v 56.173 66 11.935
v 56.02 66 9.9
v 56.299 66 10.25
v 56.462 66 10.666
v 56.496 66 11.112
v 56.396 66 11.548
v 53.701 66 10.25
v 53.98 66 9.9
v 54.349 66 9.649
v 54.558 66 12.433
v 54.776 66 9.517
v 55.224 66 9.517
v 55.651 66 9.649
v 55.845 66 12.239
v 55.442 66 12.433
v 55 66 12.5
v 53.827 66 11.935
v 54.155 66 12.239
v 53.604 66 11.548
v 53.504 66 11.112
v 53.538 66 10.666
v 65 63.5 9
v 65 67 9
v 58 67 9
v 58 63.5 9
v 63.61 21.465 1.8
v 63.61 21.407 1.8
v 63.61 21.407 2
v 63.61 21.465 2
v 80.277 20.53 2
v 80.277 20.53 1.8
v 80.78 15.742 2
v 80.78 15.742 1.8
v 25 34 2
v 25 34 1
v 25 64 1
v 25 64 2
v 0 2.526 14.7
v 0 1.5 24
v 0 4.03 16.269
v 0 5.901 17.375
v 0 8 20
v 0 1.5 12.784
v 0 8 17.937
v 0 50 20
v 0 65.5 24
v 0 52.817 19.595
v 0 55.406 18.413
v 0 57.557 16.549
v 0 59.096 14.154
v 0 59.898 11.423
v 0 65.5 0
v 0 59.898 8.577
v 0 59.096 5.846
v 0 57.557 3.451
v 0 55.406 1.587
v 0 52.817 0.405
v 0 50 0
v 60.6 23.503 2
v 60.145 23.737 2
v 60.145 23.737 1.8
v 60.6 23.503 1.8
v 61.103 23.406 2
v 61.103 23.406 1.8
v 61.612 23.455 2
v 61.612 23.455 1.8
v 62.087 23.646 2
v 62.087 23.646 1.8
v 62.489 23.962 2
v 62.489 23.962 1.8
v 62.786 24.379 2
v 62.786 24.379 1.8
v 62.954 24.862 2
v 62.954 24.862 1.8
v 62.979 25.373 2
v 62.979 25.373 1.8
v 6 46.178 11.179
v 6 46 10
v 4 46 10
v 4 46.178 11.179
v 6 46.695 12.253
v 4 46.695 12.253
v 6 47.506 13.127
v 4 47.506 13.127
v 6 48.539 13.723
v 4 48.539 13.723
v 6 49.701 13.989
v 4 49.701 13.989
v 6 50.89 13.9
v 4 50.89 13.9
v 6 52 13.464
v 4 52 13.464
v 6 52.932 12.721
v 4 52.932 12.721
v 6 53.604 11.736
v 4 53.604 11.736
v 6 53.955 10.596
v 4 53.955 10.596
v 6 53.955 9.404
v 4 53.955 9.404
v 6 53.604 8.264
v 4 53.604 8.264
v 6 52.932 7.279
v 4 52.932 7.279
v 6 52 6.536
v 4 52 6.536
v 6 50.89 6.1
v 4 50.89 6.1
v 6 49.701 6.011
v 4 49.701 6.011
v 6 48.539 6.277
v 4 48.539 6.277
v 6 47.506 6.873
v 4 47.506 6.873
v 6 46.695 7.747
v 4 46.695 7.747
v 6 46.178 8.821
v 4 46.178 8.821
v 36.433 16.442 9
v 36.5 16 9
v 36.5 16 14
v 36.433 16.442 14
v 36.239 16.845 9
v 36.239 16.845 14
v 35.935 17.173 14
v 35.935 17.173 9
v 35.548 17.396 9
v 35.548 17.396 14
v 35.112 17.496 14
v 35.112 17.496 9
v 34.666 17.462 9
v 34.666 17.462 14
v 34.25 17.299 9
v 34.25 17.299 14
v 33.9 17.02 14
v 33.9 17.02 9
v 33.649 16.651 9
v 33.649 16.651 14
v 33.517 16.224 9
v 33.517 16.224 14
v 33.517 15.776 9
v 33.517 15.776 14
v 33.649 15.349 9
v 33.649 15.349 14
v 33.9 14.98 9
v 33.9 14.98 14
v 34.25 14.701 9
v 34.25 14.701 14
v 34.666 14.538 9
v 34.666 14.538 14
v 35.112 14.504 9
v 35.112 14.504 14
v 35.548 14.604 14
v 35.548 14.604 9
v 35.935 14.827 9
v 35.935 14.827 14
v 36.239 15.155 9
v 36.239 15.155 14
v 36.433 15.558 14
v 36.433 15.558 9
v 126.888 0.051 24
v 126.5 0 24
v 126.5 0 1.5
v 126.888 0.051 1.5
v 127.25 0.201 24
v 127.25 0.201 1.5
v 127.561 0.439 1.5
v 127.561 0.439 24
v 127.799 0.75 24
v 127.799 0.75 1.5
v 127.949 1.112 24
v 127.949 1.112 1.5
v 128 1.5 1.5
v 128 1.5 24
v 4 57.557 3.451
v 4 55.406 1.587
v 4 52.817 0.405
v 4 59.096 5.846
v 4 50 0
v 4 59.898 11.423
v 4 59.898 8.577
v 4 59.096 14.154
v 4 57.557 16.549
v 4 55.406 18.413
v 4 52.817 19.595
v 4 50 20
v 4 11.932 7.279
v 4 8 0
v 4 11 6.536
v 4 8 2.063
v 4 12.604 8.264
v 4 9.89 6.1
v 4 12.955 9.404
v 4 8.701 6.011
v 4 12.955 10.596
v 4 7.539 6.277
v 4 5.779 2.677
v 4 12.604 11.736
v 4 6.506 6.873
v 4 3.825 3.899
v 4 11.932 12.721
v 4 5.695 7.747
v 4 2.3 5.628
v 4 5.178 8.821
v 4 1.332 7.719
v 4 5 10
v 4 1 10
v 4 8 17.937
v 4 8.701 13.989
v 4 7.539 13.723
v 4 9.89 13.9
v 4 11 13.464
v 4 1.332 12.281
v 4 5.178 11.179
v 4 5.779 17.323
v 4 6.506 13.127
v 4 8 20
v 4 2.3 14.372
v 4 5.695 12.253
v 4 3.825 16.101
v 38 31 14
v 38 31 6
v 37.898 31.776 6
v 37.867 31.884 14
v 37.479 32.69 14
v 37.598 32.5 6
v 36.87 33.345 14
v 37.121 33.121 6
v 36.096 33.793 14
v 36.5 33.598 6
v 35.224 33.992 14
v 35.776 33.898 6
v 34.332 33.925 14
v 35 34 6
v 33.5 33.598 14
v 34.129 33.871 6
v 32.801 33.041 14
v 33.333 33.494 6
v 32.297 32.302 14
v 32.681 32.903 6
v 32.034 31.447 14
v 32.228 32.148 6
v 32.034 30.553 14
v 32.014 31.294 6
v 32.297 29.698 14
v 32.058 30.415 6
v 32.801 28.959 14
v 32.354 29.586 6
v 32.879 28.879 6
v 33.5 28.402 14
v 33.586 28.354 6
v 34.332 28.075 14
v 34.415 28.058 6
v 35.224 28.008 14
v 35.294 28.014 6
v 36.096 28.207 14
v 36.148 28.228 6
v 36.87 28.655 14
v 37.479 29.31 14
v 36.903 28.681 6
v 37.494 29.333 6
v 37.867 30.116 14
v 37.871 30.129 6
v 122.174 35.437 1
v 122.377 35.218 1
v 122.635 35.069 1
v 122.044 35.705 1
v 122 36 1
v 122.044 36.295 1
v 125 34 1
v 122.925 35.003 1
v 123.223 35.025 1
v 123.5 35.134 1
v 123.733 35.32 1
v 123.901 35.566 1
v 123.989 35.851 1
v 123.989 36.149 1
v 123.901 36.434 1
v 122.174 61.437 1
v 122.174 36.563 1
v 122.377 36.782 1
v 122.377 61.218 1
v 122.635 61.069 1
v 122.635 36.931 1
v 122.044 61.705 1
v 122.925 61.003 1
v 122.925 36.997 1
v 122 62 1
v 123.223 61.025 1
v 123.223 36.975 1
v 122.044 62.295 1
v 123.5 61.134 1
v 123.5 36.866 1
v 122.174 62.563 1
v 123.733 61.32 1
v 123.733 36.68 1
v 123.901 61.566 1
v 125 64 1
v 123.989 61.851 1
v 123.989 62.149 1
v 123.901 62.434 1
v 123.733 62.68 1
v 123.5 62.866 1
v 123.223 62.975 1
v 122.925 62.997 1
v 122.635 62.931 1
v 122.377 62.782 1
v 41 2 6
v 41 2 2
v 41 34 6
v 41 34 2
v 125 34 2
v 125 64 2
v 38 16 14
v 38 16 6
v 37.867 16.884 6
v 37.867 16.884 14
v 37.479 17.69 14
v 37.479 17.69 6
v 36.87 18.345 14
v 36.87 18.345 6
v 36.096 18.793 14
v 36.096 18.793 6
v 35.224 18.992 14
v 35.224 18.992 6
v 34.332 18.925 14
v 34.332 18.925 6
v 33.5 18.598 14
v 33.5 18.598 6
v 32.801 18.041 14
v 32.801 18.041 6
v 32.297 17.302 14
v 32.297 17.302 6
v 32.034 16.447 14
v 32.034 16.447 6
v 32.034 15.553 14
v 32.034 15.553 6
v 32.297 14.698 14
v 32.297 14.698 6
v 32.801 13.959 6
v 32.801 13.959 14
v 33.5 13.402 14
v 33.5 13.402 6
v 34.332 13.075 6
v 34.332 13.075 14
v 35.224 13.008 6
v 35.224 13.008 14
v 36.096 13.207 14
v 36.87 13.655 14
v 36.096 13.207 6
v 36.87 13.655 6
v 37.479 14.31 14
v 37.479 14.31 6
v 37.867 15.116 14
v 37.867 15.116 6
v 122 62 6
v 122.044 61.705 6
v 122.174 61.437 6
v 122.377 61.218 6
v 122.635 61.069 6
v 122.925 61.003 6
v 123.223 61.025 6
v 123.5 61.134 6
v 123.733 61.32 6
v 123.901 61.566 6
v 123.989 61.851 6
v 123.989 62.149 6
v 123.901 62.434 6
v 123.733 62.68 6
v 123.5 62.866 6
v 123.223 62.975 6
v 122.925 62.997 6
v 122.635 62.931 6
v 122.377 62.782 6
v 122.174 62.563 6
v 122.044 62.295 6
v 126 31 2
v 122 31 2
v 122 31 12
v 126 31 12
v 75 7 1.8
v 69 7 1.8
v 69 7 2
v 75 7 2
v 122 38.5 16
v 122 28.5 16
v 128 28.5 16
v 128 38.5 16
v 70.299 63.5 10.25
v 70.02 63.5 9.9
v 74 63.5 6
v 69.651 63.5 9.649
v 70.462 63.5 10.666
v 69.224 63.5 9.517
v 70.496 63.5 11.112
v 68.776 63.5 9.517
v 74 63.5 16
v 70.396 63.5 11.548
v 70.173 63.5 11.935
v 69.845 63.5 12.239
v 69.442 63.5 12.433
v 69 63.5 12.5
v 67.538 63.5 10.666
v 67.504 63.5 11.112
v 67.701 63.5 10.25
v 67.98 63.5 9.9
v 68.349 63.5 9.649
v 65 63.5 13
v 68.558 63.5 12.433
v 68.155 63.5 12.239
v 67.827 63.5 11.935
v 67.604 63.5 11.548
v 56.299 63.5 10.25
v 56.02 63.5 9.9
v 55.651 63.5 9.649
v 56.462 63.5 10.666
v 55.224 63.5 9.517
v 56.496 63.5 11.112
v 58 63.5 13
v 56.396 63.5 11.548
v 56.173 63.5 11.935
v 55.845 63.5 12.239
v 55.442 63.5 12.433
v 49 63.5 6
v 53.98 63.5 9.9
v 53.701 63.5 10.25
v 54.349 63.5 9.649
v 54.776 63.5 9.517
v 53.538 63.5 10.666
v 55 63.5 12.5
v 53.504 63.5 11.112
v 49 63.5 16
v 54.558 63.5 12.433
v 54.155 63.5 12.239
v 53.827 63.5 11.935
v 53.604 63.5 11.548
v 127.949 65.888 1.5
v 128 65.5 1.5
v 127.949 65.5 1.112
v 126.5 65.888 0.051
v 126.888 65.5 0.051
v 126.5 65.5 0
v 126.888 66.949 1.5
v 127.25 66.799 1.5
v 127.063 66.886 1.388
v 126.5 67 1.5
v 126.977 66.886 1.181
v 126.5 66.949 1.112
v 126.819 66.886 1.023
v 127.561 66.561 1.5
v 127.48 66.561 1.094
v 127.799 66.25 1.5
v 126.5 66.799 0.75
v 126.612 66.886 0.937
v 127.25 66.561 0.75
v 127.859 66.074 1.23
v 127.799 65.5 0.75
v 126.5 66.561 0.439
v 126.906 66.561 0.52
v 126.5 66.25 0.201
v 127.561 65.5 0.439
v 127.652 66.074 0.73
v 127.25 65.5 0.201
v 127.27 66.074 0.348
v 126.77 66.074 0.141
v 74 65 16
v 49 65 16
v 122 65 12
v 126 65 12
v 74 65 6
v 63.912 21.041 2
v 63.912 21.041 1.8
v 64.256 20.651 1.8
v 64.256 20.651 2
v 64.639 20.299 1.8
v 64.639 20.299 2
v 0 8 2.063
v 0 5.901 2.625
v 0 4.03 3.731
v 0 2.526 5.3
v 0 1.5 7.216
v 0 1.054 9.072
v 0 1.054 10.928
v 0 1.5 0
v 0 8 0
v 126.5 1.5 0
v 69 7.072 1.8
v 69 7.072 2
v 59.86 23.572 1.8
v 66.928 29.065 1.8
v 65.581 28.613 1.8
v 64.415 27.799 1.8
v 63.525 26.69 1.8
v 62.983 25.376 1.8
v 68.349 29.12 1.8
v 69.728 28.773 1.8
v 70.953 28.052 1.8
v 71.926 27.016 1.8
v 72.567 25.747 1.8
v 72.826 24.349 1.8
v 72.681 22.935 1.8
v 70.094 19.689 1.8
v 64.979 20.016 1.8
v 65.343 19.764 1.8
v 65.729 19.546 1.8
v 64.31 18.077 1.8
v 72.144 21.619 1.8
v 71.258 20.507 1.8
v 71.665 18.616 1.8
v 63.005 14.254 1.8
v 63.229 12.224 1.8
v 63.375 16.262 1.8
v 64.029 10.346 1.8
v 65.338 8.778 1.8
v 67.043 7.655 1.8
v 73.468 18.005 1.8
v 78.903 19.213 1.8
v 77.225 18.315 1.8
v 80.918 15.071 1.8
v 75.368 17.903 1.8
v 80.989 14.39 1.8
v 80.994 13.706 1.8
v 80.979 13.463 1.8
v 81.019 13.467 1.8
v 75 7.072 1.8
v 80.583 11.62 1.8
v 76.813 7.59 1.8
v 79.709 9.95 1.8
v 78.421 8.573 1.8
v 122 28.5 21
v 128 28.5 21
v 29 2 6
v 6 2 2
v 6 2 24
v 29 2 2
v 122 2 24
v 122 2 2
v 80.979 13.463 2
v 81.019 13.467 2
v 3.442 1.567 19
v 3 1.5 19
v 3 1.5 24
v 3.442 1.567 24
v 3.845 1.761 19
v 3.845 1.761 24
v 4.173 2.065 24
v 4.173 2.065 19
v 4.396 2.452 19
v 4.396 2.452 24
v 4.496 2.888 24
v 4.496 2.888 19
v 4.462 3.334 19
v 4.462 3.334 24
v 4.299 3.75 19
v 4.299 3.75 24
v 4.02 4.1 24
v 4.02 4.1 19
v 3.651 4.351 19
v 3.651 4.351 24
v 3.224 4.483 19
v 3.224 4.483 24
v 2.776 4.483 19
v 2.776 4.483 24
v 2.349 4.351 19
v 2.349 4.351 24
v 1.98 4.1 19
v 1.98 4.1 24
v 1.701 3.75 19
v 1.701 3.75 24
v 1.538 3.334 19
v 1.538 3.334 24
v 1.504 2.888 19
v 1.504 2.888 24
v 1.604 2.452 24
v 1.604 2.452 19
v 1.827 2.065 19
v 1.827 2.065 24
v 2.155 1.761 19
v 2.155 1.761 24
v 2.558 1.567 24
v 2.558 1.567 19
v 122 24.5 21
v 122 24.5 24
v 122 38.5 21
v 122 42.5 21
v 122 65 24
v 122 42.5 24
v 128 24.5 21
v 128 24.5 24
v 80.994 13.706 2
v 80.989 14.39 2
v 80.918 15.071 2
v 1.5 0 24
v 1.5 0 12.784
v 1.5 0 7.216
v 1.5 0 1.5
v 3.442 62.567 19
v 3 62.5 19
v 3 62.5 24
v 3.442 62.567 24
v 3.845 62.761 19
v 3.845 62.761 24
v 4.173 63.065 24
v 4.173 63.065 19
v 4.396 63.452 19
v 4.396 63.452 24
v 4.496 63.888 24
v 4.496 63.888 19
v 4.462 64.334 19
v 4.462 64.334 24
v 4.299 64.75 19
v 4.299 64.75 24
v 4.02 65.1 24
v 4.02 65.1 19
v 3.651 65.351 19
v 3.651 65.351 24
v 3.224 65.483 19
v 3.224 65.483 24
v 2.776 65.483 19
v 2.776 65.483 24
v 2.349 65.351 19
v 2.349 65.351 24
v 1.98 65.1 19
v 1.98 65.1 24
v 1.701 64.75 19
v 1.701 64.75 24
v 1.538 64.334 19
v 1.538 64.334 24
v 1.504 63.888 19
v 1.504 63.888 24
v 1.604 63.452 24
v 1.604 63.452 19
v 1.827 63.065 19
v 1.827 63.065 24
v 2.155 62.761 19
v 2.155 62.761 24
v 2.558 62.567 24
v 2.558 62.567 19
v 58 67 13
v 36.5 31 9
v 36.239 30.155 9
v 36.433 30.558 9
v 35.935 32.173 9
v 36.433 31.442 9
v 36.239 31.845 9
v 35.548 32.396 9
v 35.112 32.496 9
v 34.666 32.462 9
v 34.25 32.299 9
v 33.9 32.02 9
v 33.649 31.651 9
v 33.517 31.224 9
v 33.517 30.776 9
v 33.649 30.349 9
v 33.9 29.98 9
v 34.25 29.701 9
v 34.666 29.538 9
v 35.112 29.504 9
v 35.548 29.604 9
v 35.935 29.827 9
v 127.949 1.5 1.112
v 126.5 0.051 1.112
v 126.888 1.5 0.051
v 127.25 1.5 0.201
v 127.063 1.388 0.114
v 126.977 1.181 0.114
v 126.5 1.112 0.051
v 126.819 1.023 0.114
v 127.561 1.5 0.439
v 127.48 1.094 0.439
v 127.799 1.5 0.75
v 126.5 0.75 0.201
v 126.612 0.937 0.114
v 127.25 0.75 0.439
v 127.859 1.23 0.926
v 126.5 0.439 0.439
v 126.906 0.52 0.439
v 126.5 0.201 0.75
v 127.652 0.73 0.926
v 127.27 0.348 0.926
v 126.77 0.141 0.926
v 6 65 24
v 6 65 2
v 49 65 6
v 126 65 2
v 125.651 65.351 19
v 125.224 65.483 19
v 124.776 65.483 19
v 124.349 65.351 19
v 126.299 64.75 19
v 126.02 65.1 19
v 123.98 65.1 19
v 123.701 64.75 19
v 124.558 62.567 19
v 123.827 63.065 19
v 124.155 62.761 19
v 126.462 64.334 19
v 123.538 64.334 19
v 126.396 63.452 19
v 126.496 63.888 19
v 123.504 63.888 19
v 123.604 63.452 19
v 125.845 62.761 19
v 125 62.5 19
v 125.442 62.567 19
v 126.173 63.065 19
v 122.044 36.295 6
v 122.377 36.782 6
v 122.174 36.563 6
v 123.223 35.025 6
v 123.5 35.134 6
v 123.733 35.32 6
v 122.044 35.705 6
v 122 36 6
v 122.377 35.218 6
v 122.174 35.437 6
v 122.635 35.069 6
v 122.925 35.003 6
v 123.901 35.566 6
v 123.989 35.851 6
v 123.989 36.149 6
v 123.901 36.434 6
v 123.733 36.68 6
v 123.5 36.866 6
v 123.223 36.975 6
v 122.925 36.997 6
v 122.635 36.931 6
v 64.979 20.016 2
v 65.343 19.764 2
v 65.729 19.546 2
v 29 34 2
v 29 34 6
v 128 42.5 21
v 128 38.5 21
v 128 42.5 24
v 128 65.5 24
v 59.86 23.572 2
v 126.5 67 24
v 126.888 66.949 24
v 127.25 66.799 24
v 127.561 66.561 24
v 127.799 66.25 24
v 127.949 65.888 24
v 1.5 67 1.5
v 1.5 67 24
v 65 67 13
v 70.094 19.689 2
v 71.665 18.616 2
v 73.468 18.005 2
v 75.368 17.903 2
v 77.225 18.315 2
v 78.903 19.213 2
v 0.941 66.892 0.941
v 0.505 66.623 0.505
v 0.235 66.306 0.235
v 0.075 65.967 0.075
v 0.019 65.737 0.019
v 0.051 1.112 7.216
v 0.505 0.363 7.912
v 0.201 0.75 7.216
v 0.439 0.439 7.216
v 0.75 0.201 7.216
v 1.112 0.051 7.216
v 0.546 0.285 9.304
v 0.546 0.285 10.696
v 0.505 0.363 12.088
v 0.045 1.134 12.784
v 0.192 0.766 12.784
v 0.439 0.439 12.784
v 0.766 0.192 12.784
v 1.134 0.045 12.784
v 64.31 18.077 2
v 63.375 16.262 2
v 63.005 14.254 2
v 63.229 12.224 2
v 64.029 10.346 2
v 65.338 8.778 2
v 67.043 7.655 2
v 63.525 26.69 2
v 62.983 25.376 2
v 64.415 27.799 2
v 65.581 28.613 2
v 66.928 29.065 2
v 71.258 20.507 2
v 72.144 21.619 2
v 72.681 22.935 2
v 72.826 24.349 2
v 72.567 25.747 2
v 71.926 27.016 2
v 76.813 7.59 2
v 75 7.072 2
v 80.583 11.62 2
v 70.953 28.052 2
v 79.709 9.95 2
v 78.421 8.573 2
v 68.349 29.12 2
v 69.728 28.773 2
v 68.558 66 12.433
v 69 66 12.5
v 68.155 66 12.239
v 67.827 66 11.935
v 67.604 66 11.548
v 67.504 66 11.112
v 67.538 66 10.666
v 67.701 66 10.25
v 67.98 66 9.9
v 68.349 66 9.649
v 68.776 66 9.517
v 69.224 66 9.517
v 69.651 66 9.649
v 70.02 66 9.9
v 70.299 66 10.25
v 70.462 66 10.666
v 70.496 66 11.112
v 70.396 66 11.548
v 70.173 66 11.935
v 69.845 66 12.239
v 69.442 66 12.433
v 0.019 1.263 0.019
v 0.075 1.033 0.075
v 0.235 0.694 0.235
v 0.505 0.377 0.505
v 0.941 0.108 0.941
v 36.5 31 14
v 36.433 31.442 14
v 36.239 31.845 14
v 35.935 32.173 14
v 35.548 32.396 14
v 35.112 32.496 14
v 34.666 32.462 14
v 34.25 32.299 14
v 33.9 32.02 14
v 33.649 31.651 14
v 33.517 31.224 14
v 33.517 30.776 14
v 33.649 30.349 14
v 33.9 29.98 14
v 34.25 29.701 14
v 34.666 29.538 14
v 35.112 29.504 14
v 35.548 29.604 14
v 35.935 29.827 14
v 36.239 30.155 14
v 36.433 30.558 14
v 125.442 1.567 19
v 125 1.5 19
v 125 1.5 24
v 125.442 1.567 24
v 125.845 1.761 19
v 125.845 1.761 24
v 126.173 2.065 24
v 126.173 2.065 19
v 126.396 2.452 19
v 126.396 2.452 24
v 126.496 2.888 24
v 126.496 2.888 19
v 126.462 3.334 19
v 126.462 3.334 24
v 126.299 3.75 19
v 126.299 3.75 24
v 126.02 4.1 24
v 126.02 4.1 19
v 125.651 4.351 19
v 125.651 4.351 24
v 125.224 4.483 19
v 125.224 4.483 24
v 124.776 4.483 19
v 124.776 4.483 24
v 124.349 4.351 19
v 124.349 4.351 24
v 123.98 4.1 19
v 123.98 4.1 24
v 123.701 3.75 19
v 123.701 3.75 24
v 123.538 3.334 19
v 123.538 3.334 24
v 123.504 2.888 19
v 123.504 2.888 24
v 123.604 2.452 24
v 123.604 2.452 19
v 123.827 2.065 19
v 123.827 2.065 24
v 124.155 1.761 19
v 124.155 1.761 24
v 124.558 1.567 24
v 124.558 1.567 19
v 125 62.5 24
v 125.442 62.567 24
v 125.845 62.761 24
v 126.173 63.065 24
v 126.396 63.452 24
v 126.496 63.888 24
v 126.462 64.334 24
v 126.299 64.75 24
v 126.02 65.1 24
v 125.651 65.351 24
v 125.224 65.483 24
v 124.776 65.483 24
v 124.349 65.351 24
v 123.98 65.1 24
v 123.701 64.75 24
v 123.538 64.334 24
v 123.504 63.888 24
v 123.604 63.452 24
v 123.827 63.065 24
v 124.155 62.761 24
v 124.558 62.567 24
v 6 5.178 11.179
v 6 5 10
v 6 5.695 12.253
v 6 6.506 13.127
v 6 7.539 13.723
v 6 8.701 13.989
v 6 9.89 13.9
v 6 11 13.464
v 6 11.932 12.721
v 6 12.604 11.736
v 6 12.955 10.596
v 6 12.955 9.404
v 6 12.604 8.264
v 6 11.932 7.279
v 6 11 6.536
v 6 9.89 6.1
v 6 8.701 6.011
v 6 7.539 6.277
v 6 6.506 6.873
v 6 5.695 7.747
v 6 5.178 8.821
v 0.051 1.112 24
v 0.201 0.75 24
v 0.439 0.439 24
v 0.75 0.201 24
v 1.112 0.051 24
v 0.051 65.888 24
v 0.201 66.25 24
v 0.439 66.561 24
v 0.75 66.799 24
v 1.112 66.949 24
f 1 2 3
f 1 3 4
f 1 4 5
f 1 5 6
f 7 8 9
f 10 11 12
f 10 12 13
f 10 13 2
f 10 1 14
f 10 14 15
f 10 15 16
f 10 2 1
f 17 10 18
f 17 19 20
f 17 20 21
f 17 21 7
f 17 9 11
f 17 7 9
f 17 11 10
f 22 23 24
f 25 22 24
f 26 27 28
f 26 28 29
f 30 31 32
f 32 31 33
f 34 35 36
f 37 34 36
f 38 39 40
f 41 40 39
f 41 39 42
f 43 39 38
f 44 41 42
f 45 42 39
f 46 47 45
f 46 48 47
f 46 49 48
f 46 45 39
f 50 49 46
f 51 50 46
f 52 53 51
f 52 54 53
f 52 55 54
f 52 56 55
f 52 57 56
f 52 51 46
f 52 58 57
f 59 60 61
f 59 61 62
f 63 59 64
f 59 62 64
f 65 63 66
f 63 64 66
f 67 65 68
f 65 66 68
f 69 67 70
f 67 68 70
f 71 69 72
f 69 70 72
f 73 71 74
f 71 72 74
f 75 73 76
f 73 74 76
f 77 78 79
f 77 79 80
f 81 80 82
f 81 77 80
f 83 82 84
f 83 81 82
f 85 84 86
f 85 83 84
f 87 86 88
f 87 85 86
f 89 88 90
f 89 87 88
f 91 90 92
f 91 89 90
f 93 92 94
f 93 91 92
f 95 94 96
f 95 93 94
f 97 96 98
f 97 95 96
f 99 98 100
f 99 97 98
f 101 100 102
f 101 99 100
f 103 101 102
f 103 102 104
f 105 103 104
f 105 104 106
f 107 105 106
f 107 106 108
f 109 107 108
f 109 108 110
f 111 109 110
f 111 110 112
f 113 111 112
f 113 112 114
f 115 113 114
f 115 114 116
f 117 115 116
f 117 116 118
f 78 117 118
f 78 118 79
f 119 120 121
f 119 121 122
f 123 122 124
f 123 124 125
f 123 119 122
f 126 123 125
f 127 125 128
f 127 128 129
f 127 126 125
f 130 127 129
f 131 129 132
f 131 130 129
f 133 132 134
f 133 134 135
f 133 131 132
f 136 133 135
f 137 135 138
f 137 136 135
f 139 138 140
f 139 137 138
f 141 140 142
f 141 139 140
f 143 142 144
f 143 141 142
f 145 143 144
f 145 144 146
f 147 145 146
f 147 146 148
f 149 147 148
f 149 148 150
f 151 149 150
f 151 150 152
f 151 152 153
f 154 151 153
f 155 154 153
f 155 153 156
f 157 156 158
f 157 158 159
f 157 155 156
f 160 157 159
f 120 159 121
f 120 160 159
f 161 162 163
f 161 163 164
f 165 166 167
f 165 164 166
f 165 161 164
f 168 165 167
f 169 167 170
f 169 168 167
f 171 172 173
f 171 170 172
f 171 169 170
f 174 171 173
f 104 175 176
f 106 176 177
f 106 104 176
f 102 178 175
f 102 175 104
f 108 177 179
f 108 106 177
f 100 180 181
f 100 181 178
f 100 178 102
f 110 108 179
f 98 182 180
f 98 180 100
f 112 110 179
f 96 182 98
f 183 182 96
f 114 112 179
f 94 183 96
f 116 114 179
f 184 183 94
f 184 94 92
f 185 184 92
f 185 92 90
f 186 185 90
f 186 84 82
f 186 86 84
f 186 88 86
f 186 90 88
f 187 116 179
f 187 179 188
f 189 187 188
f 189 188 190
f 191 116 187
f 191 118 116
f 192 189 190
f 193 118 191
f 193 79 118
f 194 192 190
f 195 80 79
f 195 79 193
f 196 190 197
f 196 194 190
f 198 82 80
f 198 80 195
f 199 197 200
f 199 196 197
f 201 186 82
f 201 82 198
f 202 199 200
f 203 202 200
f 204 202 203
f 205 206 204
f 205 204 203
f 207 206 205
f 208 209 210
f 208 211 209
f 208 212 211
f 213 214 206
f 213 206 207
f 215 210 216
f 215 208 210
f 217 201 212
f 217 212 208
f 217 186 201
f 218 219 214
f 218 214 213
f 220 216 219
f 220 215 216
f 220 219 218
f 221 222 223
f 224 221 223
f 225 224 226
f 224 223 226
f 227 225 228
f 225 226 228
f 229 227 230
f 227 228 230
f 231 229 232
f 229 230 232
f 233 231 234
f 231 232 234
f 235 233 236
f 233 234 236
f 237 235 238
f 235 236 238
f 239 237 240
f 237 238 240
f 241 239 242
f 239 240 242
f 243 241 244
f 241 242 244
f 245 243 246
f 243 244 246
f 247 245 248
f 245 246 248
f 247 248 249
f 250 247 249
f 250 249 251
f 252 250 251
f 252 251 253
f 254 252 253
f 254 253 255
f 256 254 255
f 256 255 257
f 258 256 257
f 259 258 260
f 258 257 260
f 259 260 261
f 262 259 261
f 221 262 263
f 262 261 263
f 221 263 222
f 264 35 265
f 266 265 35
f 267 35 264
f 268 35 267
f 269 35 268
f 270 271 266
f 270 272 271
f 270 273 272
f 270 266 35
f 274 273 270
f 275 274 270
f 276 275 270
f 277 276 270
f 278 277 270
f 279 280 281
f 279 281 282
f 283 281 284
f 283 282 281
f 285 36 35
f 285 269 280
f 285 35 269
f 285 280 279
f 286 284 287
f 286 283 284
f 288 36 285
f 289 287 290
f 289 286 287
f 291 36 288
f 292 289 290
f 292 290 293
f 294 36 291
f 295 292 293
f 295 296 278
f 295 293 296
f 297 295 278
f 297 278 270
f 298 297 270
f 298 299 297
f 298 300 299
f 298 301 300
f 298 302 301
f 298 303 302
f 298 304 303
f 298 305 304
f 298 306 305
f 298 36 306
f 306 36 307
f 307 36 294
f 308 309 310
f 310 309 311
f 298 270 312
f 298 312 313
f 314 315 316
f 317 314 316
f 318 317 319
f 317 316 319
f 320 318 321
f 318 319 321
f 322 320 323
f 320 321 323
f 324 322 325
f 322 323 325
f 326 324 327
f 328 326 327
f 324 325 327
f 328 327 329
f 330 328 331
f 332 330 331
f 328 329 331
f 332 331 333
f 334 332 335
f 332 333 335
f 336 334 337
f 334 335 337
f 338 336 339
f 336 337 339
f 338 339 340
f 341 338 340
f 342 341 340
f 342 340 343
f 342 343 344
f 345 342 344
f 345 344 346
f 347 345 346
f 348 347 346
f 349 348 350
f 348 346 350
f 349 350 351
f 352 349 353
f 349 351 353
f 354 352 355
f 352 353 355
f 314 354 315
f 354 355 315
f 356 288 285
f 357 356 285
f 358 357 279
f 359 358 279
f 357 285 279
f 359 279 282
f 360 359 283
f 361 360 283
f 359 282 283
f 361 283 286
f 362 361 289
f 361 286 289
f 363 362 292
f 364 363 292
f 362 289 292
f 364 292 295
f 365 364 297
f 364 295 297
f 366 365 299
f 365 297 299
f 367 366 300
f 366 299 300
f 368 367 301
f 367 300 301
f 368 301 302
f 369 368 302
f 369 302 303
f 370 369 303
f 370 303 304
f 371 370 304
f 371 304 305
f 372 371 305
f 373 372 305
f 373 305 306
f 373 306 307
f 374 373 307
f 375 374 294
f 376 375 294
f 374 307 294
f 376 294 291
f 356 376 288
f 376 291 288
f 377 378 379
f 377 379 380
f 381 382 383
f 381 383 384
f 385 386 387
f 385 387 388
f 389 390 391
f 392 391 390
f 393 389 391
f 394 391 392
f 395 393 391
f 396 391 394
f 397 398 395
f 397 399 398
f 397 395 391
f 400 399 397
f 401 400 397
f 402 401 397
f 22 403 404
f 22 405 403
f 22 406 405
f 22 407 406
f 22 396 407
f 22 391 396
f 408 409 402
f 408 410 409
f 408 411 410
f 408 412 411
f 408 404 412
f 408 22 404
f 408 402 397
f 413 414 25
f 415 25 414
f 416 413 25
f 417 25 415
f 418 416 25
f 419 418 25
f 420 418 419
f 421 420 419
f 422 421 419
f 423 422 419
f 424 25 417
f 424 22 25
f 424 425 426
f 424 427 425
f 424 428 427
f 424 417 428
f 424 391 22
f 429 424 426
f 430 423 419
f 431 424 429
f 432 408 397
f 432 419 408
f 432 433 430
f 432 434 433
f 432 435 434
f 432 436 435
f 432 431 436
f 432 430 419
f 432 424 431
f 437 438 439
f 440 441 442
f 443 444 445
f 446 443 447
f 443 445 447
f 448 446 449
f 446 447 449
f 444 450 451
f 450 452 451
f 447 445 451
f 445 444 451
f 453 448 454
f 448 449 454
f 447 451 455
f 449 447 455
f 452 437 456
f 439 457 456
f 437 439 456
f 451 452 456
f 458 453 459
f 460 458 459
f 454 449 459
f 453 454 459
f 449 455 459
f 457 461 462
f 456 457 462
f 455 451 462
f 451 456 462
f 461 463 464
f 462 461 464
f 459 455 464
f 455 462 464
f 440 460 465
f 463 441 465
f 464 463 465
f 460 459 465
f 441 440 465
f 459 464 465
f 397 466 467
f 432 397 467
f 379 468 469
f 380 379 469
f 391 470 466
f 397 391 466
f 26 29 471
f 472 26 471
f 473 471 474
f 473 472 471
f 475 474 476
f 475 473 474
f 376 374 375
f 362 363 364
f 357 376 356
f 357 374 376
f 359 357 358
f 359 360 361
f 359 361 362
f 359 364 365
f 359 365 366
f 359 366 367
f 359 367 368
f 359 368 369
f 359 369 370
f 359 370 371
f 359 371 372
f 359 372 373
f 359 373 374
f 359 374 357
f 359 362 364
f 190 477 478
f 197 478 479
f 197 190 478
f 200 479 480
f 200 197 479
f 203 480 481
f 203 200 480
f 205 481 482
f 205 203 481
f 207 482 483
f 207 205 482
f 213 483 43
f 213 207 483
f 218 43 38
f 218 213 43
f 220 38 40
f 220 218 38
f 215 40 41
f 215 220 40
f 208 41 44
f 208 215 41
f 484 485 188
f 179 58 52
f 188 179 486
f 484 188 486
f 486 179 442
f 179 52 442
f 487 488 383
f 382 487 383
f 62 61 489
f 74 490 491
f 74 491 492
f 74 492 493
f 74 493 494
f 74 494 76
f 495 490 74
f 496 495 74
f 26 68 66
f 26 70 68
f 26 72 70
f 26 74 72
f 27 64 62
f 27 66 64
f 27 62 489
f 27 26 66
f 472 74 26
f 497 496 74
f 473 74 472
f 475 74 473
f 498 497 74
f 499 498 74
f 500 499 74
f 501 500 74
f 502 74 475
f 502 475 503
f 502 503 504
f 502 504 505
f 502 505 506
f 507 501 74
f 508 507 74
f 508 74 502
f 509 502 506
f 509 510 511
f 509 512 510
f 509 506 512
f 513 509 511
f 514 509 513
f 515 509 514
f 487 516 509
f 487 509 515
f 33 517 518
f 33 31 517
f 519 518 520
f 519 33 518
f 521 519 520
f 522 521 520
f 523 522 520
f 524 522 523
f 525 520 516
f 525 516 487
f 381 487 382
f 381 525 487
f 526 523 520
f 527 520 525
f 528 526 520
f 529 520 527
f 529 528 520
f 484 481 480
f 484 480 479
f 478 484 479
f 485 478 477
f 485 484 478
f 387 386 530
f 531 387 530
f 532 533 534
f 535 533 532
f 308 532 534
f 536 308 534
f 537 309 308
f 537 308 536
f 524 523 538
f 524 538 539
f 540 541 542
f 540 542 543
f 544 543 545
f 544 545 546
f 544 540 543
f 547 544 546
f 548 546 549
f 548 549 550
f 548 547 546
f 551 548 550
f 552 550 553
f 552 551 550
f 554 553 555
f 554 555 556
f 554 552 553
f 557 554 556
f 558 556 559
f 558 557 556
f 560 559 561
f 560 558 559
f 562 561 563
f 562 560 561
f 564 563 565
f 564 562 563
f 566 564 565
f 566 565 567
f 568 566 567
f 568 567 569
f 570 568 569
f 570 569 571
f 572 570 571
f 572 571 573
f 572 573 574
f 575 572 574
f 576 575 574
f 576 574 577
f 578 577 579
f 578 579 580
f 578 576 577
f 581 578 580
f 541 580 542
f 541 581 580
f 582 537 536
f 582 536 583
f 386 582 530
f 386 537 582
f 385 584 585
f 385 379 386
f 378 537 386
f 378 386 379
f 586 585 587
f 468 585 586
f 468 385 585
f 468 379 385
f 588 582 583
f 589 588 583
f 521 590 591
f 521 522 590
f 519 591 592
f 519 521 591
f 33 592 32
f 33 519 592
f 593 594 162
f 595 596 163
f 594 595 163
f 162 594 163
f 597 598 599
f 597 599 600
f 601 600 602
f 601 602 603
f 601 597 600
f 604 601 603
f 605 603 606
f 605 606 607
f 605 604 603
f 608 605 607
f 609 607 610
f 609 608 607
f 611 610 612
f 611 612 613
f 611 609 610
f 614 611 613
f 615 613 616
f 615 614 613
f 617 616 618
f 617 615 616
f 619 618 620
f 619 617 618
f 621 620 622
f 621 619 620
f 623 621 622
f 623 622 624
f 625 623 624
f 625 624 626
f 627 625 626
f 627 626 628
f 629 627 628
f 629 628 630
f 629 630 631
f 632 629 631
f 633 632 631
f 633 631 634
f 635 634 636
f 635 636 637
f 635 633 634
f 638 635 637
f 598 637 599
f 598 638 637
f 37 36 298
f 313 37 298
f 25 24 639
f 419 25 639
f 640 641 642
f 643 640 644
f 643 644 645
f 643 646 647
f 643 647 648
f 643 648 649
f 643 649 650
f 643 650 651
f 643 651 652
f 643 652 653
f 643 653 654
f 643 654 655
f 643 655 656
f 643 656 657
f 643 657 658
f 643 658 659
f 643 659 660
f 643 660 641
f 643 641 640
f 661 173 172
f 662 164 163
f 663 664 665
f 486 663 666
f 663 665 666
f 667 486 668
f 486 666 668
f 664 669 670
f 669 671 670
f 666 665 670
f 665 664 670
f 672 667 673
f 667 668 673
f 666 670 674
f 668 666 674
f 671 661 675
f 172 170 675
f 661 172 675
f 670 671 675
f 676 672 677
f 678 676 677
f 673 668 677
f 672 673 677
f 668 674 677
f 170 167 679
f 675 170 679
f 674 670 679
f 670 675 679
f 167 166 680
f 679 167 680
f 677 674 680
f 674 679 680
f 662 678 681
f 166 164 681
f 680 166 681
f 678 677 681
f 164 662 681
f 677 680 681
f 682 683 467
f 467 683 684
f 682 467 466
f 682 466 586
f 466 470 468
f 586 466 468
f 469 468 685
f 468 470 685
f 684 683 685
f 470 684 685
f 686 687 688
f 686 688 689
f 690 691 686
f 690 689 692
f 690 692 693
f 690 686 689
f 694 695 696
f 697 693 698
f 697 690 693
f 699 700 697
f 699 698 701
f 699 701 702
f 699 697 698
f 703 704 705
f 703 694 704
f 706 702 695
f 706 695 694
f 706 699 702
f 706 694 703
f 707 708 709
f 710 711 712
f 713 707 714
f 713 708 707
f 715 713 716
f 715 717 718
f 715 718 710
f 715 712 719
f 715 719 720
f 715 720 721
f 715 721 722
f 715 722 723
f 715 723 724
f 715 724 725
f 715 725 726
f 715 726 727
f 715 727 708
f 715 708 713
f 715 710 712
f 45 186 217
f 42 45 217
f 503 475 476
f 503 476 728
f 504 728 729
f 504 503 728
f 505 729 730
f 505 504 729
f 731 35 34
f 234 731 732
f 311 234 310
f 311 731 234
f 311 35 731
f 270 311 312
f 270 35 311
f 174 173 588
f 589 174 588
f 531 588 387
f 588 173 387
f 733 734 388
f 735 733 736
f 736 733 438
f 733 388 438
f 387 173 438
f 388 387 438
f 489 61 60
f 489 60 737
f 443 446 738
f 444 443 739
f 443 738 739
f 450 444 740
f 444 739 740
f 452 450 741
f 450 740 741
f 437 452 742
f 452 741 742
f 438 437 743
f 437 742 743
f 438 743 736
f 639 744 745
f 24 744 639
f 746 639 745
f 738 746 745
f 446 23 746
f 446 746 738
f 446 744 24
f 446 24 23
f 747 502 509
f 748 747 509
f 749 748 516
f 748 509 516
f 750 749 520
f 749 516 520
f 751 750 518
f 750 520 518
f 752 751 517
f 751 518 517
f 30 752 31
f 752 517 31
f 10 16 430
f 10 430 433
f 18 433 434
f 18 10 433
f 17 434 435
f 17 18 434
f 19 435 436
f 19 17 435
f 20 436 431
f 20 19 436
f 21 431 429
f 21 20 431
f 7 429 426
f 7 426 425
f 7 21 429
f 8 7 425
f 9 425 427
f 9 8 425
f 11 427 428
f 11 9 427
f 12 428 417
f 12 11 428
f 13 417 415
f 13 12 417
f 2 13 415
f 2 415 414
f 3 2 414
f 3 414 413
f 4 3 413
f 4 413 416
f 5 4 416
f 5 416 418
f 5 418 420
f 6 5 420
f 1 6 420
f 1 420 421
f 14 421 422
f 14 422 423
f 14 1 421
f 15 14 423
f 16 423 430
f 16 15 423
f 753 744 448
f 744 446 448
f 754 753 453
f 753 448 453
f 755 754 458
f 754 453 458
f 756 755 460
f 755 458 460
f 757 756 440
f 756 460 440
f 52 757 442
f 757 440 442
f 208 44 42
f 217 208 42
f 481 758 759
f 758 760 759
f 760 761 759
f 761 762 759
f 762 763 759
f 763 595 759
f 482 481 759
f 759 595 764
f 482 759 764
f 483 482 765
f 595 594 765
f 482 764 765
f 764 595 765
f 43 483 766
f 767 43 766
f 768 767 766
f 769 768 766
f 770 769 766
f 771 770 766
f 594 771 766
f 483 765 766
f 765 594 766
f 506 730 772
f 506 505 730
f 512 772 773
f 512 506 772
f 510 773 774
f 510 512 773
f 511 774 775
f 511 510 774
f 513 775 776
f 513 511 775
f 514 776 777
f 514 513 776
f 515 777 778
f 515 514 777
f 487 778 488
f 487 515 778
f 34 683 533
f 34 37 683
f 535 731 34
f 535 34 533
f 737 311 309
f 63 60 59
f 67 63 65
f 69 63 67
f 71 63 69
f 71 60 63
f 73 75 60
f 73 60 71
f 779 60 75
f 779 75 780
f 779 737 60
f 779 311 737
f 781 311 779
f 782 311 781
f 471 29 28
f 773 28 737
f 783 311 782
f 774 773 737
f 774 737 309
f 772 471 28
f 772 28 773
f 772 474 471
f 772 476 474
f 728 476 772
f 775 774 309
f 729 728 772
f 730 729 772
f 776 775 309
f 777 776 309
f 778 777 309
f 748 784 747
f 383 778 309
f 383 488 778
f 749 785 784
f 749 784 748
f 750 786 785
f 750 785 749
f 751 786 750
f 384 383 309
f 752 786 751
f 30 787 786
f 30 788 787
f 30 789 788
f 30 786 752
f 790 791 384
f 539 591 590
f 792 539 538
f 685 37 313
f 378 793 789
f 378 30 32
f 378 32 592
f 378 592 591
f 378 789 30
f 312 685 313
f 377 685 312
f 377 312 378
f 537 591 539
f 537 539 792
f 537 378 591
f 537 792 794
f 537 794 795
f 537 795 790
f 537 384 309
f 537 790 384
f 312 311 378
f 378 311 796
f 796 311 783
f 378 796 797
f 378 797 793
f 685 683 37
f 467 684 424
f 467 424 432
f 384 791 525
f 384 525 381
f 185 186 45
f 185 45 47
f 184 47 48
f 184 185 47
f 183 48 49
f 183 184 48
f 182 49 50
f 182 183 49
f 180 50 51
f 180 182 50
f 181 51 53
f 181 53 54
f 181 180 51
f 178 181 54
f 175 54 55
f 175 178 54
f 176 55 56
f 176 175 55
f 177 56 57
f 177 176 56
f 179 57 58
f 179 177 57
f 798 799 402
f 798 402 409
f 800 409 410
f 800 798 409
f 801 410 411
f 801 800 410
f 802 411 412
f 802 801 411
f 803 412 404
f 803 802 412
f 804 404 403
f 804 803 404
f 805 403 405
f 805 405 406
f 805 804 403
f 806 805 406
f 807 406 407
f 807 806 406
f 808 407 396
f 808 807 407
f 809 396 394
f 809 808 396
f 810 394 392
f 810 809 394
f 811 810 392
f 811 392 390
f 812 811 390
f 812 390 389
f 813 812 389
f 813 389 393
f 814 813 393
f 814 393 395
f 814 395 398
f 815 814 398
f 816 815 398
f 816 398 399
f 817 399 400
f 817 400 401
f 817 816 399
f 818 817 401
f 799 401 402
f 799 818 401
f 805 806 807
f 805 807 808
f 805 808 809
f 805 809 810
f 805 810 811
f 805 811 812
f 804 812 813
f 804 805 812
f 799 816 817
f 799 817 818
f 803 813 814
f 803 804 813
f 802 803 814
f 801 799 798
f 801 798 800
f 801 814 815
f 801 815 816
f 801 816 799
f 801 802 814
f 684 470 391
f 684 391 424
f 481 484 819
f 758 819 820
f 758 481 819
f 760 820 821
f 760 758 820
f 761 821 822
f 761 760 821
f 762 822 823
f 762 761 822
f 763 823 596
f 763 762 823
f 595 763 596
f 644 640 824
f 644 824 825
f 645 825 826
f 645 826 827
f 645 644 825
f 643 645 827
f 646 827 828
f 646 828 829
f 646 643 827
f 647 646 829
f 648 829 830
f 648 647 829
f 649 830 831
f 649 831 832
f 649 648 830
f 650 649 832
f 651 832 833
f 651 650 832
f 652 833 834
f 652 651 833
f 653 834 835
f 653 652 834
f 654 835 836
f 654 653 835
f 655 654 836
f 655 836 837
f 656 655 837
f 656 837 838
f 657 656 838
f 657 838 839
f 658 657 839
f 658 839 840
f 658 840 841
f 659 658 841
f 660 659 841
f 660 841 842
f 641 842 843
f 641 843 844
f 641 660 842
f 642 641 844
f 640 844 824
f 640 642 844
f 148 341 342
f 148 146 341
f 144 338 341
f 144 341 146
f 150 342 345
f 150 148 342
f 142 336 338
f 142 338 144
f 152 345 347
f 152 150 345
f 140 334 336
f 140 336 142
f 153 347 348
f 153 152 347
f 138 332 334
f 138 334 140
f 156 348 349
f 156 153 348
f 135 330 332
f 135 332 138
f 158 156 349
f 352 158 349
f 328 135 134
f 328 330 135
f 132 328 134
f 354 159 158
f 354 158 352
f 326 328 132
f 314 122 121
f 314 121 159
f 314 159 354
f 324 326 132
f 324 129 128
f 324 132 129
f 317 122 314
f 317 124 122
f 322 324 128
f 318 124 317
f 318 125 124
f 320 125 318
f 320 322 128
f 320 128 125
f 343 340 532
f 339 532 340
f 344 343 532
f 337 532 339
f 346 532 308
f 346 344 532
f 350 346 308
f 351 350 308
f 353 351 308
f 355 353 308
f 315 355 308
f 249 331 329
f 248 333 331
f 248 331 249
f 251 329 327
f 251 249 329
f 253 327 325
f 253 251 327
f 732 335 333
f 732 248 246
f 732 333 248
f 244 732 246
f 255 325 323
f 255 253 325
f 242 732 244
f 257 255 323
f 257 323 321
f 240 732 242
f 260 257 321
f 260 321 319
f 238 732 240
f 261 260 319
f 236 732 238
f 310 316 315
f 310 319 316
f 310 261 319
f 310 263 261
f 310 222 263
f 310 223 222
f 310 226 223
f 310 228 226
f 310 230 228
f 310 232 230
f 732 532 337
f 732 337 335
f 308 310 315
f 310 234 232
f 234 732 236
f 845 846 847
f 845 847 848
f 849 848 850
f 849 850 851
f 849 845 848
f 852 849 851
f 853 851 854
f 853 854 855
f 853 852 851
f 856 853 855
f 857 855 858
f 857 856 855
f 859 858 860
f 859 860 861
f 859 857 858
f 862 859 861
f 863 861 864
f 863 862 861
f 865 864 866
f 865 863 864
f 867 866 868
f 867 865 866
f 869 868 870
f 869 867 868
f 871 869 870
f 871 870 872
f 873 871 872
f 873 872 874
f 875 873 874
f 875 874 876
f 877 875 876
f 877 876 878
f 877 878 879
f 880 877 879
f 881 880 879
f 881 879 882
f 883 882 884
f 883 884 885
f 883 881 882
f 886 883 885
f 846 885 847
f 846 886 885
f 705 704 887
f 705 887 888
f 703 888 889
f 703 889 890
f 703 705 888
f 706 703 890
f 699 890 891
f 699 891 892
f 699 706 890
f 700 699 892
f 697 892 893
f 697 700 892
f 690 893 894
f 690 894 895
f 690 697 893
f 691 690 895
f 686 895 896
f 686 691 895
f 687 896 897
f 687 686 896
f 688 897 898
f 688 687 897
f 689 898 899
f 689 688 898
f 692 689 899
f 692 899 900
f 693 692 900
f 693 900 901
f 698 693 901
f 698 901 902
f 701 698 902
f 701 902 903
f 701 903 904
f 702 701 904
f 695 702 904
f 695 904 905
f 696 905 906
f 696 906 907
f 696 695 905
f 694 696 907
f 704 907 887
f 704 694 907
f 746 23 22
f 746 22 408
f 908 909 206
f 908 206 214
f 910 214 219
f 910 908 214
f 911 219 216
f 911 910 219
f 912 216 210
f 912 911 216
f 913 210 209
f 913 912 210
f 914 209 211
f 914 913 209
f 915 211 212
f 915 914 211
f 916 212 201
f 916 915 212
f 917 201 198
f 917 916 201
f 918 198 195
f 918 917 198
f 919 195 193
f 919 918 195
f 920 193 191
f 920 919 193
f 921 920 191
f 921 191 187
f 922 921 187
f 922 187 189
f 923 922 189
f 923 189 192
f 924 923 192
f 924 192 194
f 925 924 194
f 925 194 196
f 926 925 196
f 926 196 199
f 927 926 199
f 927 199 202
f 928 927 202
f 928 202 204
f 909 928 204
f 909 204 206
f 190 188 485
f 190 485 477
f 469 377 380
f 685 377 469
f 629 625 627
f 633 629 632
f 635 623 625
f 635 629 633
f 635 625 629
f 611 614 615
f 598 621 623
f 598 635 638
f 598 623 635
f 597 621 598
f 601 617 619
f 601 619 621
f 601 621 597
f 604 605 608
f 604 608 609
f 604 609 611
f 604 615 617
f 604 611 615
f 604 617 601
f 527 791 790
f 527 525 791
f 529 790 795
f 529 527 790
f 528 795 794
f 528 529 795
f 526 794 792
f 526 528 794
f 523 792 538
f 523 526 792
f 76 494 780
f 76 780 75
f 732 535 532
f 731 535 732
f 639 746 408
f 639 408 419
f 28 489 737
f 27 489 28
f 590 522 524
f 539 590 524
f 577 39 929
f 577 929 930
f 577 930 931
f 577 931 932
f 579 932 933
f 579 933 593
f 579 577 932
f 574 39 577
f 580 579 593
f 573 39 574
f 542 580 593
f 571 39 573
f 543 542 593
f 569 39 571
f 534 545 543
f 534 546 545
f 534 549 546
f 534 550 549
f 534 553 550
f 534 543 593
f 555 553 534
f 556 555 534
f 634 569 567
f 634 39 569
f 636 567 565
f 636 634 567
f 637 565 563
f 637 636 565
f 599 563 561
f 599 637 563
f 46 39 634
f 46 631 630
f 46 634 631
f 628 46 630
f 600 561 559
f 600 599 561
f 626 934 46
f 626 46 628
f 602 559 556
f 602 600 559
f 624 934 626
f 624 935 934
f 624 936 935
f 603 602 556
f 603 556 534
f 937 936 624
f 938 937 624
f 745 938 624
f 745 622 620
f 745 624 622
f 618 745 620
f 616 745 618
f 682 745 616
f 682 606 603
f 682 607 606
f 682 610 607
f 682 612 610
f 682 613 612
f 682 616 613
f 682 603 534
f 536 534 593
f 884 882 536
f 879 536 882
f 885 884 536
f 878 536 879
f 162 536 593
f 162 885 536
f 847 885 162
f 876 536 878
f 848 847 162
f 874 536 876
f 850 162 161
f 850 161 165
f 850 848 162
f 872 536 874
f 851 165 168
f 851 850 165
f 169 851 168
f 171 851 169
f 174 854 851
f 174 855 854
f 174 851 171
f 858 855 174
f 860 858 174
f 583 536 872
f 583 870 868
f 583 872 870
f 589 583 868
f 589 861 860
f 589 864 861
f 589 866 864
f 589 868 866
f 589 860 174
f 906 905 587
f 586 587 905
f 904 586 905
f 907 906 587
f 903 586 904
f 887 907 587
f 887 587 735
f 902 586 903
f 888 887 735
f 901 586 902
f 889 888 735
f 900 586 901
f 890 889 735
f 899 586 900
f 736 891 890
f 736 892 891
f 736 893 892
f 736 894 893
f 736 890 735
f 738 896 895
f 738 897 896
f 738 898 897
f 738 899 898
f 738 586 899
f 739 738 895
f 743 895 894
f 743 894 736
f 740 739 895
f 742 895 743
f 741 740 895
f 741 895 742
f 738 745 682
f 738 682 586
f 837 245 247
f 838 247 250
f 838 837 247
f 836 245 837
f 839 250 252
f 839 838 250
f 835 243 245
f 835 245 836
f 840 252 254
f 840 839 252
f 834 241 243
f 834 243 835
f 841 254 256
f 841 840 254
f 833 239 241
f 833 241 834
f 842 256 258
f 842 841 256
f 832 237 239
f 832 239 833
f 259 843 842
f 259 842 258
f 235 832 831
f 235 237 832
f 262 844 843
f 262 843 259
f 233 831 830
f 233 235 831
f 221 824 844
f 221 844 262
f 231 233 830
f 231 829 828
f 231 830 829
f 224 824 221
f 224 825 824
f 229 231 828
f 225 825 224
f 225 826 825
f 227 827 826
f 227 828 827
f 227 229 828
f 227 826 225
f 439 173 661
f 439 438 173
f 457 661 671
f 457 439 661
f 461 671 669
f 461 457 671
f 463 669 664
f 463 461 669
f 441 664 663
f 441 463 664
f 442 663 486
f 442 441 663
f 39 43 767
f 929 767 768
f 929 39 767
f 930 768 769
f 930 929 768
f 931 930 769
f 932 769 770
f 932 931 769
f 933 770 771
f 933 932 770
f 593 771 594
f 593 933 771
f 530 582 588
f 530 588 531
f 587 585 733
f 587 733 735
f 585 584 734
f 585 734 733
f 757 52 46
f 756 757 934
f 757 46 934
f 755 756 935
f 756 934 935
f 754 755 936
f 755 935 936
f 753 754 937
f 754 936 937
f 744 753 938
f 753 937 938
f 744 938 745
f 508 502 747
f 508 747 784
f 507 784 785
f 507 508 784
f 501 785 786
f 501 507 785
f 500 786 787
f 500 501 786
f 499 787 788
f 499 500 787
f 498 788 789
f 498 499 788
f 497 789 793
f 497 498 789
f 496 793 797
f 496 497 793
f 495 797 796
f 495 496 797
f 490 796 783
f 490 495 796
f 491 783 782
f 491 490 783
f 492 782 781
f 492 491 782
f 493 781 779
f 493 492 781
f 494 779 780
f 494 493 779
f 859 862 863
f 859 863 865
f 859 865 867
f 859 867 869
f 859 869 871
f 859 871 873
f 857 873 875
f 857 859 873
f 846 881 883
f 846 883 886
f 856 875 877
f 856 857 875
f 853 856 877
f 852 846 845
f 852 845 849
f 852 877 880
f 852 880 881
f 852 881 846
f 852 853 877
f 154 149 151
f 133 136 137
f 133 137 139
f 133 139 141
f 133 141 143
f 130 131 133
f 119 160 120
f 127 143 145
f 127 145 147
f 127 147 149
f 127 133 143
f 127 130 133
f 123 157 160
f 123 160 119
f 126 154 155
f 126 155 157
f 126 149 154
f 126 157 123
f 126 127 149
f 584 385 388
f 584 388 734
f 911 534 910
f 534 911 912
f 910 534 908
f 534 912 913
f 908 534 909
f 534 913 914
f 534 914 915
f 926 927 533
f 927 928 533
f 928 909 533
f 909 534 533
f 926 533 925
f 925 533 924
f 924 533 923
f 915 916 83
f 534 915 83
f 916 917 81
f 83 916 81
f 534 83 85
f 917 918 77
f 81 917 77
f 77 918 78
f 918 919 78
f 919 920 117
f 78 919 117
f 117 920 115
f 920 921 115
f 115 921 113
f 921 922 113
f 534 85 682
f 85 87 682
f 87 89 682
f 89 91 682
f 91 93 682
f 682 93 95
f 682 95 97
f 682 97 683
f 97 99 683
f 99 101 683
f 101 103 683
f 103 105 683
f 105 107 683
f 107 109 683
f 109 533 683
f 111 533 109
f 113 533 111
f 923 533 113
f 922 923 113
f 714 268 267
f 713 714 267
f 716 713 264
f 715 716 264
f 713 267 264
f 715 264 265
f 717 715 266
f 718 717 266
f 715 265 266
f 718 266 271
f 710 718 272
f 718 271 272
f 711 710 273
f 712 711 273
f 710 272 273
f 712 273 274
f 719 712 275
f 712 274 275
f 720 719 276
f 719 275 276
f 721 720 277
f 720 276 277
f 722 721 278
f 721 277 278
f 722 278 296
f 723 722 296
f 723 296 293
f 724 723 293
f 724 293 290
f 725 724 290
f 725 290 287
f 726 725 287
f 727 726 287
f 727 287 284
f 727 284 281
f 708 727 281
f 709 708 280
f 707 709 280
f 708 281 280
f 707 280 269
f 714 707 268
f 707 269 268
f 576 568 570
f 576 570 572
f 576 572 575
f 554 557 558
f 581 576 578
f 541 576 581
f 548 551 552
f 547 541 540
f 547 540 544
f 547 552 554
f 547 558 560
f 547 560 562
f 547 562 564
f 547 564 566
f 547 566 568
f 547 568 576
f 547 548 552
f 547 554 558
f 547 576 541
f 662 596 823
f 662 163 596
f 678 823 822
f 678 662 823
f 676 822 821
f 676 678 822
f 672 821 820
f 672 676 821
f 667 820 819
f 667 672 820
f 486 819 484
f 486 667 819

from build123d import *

# Parameters (mm, degrees)
BOX_W             = 128
BOX_H             = 67
BOX_DEPTH         = 24
BOX001_W          = 116
BOX001_H          = 63
BOX001_DEPTH      = 22
BOX002_W          = 4
BOX002_H          = 34
BOX002_DEPTH      = 10
BOX003_W          = 100
BOX003_H          = 30
BOX003_DEPTH      = 1
BOX004_W          = 12
BOX004_H          = 32
BOX004_DEPTH      = 4
CYLINDER_R        = 3
CYLINDER_DEPTH    = 8
CYLINDER001_R     = 3
CYLINDER001_DEPTH = 8
CYLINDER002_R     = 1.5
CYLINDER002_DEPTH = 5
CYLINDER003_R     = 1.5
CYLINDER003_DEPTH = 5
BOX005_W          = 42
BOX005_H          = 20
BOX005_DEPTH      = 4
CYLINDER004_R     = 4
CYLINDER004_DEPTH = 6
CYLINDER005_R     = 4
CYLINDER005_DEPTH = 6
CYLINDER006_R     = 10
CYLINDER006_DEPTH = 4
CYLINDER007_R     = 8
CYLINDER007_DEPTH = 4
BOX006_W          = 10
BOX006_H          = 25
BOX006_DEPTH      = 1.5
BOX007_W          = 4
BOX007_H          = 7
BOX007_DEPTH      = 6
CYLINDER008_R     = 1.5
CYLINDER008_DEPTH = 2.5
CYLINDER009_R     = 1.5
CYLINDER009_DEPTH = 2.5
CYLINDER010_R     = 1
CYLINDER010_DEPTH = 5
CYLINDER011_R     = 1
CYLINDER011_DEPTH = 5
BOX008_W          = 18
BOX008_H          = 3
BOX008_DEPTH      = 6
BOX009_W          = 10
BOX009_H          = 5
BOX009_DEPTH      = 6
CYLINDER012_R     = 1.5
CYLINDER012_DEPTH = 5
CYLINDER013_R     = 1.5
CYLINDER013_DEPTH = 5
CYLINDER014_R     = 1.5
CYLINDER014_DEPTH = 5
CYLINDER015_R     = 1.5
CYLINDER015_DEPTH = 5
FILLET_R          = 1.5
CYLINDER016_R     = 5
CYLINDER016_DEPTH = 0.2
CYLINDER017_R     = 7
CYLINDER017_DEPTH = 0.2
CYLINDER018_R     = 7
CYLINDER018_DEPTH = 0.2
BOX010_W          = 5
BOX010_H          = 6
BOX010_DEPTH      = 0.2
BOX011_W          = 9
BOX011_H          = 4
BOX011_DEPTH      = 0.2
CYLINDER019_R     = 7
CYLINDER019_DEPTH = 0.2
CYLINDER020_R     = 5
CYLINDER020_DEPTH = 0.2
PRISM_DEPTH       = 0.2
CYLINDER021_R     = 1.8
CYLINDER021_DEPTH = 0.2


with BuildPart() as part:
    # Box → Box (join)
    with BuildSketch(Plane.XY):
        with Locations((64, 33.5)):
            Rectangle(BOX_W, BOX_H)
    extrude(amount=BOX_DEPTH)

    # Box001 → Box001 (cut)
    with BuildSketch(Plane(origin=(6, 2, 2), x_dir=(1, 0, 0), z_dir=(0, 0, 1))):
        with Locations((58, 31.5)):
            Rectangle(BOX001_W, BOX001_H)
    extrude(amount=BOX001_DEPTH, mode=Mode.SUBTRACT)

    # Box002 → Box002 (cut)
    with BuildSketch(Plane(origin=(122, 31, 2), x_dir=(1, 0, 0), z_dir=(0, 0, 1))):
        with Locations((2, 17)):
            Rectangle(BOX002_W, BOX002_H)
    extrude(amount=BOX002_DEPTH, mode=Mode.SUBTRACT)

    # Box003 → Box003 (cut)
    with BuildSketch(Plane(origin=(25, 34, 1), x_dir=(1, 0, 0), z_dir=(0, 0, 1))):
        with Locations((50, 15)):
            Rectangle(BOX003_W, BOX003_H)
    extrude(amount=BOX003_DEPTH, mode=Mode.SUBTRACT)

    # Box004 → Box004 (join)
    with BuildSketch(Plane(origin=(29, 2, 2), x_dir=(1, 0, 0), z_dir=(0, 0, 1))):
        with Locations((6, 16)):
            Rectangle(BOX004_W, BOX004_H)
    extrude(amount=BOX004_DEPTH)

    # Cylinder → Cylinder (join)
    with BuildSketch(Plane(origin=(35, 16, 6), x_dir=(1, 0, 0), z_dir=(0, 0, 1))):
        Circle(CYLINDER_R)
    extrude(amount=CYLINDER_DEPTH)

    # Cylinder001 → Cylinder001 (join)
    with BuildSketch(Plane(origin=(35, 31, 6), x_dir=(1, 0, 0), z_dir=(0, 0, 1))):
        Circle(CYLINDER001_R)
    extrude(amount=CYLINDER001_DEPTH)

    # Cylinder002 → Cylinder002 (cut)
    with BuildSketch(Plane(origin=(35, 31, 9), x_dir=(1, 0, 0), z_dir=(0, 0, 1))):
        Circle(CYLINDER002_R)
    extrude(amount=CYLINDER002_DEPTH, mode=Mode.SUBTRACT)

    # Cylinder003 → Cylinder003 (cut)
    with BuildSketch(Plane(origin=(35, 16, 9), x_dir=(1, 0, 0), z_dir=(0, 0, 1))):
        Circle(CYLINDER003_R)
    extrude(amount=CYLINDER003_DEPTH, mode=Mode.SUBTRACT)

    # Box005 → Box005 (cut)
    with BuildSketch(Plane(origin=(4, 50, 0), x_dir=(0, -1, 0), z_dir=(-1, 0, 0))):
        with Locations((21, 10)):
            Rectangle(BOX005_W, BOX005_H)
    extrude(amount=BOX005_DEPTH, mode=Mode.SUBTRACT)

    # Cylinder004 → Cylinder004 (cut)
    with BuildSketch(Plane(origin=(6, 50, 10), x_dir=(0, -1, 0), z_dir=(-1, 0, 0))):
        Circle(CYLINDER004_R)
    extrude(amount=CYLINDER004_DEPTH, mode=Mode.SUBTRACT)

    # Cylinder005 → Cylinder005 (cut)
    with BuildSketch(Plane(origin=(6, 9, 10), x_dir=(0, -1, 0), z_dir=(-1, 0, 0))):
        Circle(CYLINDER005_R)
    extrude(amount=CYLINDER005_DEPTH, mode=Mode.SUBTRACT)

    # Cylinder006 → Cylinder006 (cut)
    with BuildSketch(Plane(origin=(4, 50, 10), x_dir=(0, -1, 0), z_dir=(-1, 0, 0))):
        Circle(CYLINDER006_R)
    extrude(amount=CYLINDER006_DEPTH, mode=Mode.SUBTRACT)

    # Cylinder007 → Cylinder007 (cut)
    with BuildSketch(Plane(origin=(4, 9, 10), x_dir=(0, -1, 0), z_dir=(-1, 0, 0))):
        Circle(CYLINDER007_R)
    extrude(amount=CYLINDER007_DEPTH, mode=Mode.SUBTRACT)

    # Box006 → Box006 (join)
    with BuildSketch(Plane(origin=(74, 65, 6), x_dir=(0, 0, 1), z_dir=(0, -1, 0))):
        with Locations((5, 12.5)):
            Rectangle(BOX006_W, BOX006_H)
    extrude(amount=BOX006_DEPTH)

    # Box007 → Box007 (cut)
    with BuildSketch(Plane(origin=(65, 67.5, 9), x_dir=(0, 0, 1), z_dir=(0, -1, 0))):
        with Locations((2, 3.5)):
            Rectangle(BOX007_W, BOX007_H)
    extrude(amount=BOX007_DEPTH, mode=Mode.SUBTRACT)

    # Cylinder008 → Cylinder008 (cut)
    with BuildSketch(Plane(origin=(69, 66, 11), x_dir=(0, 0, 1), z_dir=(0, -1, 0))):
        Circle(CYLINDER008_R)
    extrude(amount=CYLINDER008_DEPTH, mode=Mode.SUBTRACT)

    # Cylinder009 → Cylinder009 (cut)
    with BuildSketch(Plane(origin=(55, 66, 11), x_dir=(0, 0, 1), z_dir=(0, -1, 0))):
        Circle(CYLINDER009_R)
    extrude(amount=CYLINDER009_DEPTH, mode=Mode.SUBTRACT)

    # Cylinder010 → Cylinder010 (join)
    with BuildSketch(Plane(origin=(123, 36, 1), x_dir=(-1, 0, 0), z_dir=(0, 0, 1))):
        Circle(CYLINDER010_R)
    extrude(amount=CYLINDER010_DEPTH)

    # Cylinder011 → Cylinder011 (join)
    with BuildSketch(Plane(origin=(123, 62, 1), x_dir=(-1, 0, 0), z_dir=(0, 0, 1))):
        Circle(CYLINDER011_R)
    extrude(amount=CYLINDER011_DEPTH)

    # Box008 → Box008 (cut)
    with BuildSketch(Plane(origin=(122, 24.5, 21), x_dir=(0, 1, 0), z_dir=(1, 0, 0))):
        with Locations((9, 1.5)):
            Rectangle(BOX008_W, BOX008_H)
    extrude(amount=BOX008_DEPTH, mode=Mode.SUBTRACT)

    # Box009 → Box009 (cut)
    with BuildSketch(Plane(origin=(122, 28.5, 16), x_dir=(0, 1, 0), z_dir=(1, 0, 0))):
        with Locations((5, 2.5)):
            Rectangle(BOX009_W, BOX009_H)
    extrude(amount=BOX009_DEPTH, mode=Mode.SUBTRACT)

    # Cylinder012 → Cylinder012 (cut)
    with BuildSketch(Plane(origin=(3, 3, 19), x_dir=(0, -1, 0), z_dir=(0, 0, 1))):
        Circle(CYLINDER012_R)
    extrude(amount=CYLINDER012_DEPTH, mode=Mode.SUBTRACT)

    # Cylinder013 → Cylinder013 (cut)
    with BuildSketch(Plane(origin=(3, 64, 19), x_dir=(0, -1, 0), z_dir=(0, 0, 1))):
        Circle(CYLINDER013_R)
    extrude(amount=CYLINDER013_DEPTH, mode=Mode.SUBTRACT)

    # Cylinder014 → Cylinder014 (cut)
    with BuildSketch(Plane(origin=(125, 64, 19), x_dir=(0, -1, 0), z_dir=(0, 0, 1))):
        Circle(CYLINDER014_R)
    extrude(amount=CYLINDER014_DEPTH, mode=Mode.SUBTRACT)

    # Cylinder015 → Cylinder015 (cut)
    with BuildSketch(Plane(origin=(125, 3, 19), x_dir=(0, -1, 0), z_dir=(0, 0, 1))):
        Circle(CYLINDER015_R)
    extrude(amount=CYLINDER015_DEPTH, mode=Mode.SUBTRACT)

    # Fillet
    fillet_edges = [part.edges().sort_by_distance(p)[0] for p in [
        (128, 0, 12),
        (128, 33.5, 0),
        (128, 67, 12),
        (64, 67, 0),
        (64, 0, 0),
        (0, 67, 12),
        (0, 0, 12),
    ]]
    fillet(fillet_edges, radius=FILLET_R)

    # Cylinder016 → Cylinder016 (cut)
    with BuildSketch(Plane(origin=(68, 24, 1.8), x_dir=(0, -1, 0), z_dir=(0, 0, 1))):
        Circle(CYLINDER016_R)
    extrude(amount=CYLINDER016_DEPTH, mode=Mode.SUBTRACT)

    # Cylinder017 → Cylinder017 (cut)
    with BuildSketch(Plane(origin=(70, 14, 1.8), x_dir=(0, -1, 0), z_dir=(0, 0, 1))):
        Circle(CYLINDER017_R)
    extrude(amount=CYLINDER017_DEPTH, mode=Mode.SUBTRACT)

    # Cylinder018 → Cylinder018 (cut)
    with BuildSketch(Plane(origin=(74, 14, 1.8), x_dir=(0, -1, 0), z_dir=(0, 0, 1))):
        Circle(CYLINDER018_R)
    extrude(amount=CYLINDER018_DEPTH, mode=Mode.SUBTRACT)

    # Box010 → Box010 (cut)
    with BuildSketch(Plane(origin=(69, 12, 1.8), x_dir=(0, -1, 0), z_dir=(0, 0, 1))):
        with Locations((2.5, 3)):
            Rectangle(BOX010_W, BOX010_H)
    extrude(amount=BOX010_DEPTH, mode=Mode.SUBTRACT)

    # Box011 → Box011 (cut)
    with BuildSketch(Plane(origin=(76.1, 22, 1.8), x_dir=(0.104528, -0.994522, 0), z_dir=(0, 0, 1))):
        with Locations((4.5, 2)):
            Rectangle(BOX011_W, BOX011_H)
    extrude(amount=BOX011_DEPTH, mode=Mode.SUBTRACT)

    # Cylinder019 → Cylinder019 (join)
    with BuildSketch(Plane(origin=(74.791893, 24.879037, 1.8), x_dir=(0.104528, -0.994522, 0), z_dir=(0, 0, 1))):
        Circle(CYLINDER019_R)
    extrude(amount=CYLINDER019_DEPTH)

    # Cylinder020 → Cylinder020 (cut)
    with BuildSketch(Plane(origin=(67.830239, 24.147338, 1.8), x_dir=(0.104528, -0.994522, 0), z_dir=(0, 0, 1))):
        Circle(CYLINDER020_R)
    extrude(amount=CYLINDER020_DEPTH, mode=Mode.SUBTRACT)

    # Prism → Prism (cut)
    with BuildSketch(Plane(origin=(62.360369, 23.572431, 1.8), x_dir=(0.5, -0.866025, 0), z_dir=(0, 0, 1))):
        Polygon((2.5, 0), (-1.25, 2.165064), (-1.25, -2.165064), align=None)
    extrude(amount=PRISM_DEPTH, mode=Mode.SUBTRACT)

    # Cylinder021 → Cylinder021 (join)
    with BuildSketch(Plane(origin=(61.187164, 25.204482, 1.8), x_dir=(0.5, -0.866025, 0), z_dir=(0, 0, 1))):
        Circle(CYLINDER021_R)
    extrude(amount=CYLINDER021_DEPTH)


solid = part.part
